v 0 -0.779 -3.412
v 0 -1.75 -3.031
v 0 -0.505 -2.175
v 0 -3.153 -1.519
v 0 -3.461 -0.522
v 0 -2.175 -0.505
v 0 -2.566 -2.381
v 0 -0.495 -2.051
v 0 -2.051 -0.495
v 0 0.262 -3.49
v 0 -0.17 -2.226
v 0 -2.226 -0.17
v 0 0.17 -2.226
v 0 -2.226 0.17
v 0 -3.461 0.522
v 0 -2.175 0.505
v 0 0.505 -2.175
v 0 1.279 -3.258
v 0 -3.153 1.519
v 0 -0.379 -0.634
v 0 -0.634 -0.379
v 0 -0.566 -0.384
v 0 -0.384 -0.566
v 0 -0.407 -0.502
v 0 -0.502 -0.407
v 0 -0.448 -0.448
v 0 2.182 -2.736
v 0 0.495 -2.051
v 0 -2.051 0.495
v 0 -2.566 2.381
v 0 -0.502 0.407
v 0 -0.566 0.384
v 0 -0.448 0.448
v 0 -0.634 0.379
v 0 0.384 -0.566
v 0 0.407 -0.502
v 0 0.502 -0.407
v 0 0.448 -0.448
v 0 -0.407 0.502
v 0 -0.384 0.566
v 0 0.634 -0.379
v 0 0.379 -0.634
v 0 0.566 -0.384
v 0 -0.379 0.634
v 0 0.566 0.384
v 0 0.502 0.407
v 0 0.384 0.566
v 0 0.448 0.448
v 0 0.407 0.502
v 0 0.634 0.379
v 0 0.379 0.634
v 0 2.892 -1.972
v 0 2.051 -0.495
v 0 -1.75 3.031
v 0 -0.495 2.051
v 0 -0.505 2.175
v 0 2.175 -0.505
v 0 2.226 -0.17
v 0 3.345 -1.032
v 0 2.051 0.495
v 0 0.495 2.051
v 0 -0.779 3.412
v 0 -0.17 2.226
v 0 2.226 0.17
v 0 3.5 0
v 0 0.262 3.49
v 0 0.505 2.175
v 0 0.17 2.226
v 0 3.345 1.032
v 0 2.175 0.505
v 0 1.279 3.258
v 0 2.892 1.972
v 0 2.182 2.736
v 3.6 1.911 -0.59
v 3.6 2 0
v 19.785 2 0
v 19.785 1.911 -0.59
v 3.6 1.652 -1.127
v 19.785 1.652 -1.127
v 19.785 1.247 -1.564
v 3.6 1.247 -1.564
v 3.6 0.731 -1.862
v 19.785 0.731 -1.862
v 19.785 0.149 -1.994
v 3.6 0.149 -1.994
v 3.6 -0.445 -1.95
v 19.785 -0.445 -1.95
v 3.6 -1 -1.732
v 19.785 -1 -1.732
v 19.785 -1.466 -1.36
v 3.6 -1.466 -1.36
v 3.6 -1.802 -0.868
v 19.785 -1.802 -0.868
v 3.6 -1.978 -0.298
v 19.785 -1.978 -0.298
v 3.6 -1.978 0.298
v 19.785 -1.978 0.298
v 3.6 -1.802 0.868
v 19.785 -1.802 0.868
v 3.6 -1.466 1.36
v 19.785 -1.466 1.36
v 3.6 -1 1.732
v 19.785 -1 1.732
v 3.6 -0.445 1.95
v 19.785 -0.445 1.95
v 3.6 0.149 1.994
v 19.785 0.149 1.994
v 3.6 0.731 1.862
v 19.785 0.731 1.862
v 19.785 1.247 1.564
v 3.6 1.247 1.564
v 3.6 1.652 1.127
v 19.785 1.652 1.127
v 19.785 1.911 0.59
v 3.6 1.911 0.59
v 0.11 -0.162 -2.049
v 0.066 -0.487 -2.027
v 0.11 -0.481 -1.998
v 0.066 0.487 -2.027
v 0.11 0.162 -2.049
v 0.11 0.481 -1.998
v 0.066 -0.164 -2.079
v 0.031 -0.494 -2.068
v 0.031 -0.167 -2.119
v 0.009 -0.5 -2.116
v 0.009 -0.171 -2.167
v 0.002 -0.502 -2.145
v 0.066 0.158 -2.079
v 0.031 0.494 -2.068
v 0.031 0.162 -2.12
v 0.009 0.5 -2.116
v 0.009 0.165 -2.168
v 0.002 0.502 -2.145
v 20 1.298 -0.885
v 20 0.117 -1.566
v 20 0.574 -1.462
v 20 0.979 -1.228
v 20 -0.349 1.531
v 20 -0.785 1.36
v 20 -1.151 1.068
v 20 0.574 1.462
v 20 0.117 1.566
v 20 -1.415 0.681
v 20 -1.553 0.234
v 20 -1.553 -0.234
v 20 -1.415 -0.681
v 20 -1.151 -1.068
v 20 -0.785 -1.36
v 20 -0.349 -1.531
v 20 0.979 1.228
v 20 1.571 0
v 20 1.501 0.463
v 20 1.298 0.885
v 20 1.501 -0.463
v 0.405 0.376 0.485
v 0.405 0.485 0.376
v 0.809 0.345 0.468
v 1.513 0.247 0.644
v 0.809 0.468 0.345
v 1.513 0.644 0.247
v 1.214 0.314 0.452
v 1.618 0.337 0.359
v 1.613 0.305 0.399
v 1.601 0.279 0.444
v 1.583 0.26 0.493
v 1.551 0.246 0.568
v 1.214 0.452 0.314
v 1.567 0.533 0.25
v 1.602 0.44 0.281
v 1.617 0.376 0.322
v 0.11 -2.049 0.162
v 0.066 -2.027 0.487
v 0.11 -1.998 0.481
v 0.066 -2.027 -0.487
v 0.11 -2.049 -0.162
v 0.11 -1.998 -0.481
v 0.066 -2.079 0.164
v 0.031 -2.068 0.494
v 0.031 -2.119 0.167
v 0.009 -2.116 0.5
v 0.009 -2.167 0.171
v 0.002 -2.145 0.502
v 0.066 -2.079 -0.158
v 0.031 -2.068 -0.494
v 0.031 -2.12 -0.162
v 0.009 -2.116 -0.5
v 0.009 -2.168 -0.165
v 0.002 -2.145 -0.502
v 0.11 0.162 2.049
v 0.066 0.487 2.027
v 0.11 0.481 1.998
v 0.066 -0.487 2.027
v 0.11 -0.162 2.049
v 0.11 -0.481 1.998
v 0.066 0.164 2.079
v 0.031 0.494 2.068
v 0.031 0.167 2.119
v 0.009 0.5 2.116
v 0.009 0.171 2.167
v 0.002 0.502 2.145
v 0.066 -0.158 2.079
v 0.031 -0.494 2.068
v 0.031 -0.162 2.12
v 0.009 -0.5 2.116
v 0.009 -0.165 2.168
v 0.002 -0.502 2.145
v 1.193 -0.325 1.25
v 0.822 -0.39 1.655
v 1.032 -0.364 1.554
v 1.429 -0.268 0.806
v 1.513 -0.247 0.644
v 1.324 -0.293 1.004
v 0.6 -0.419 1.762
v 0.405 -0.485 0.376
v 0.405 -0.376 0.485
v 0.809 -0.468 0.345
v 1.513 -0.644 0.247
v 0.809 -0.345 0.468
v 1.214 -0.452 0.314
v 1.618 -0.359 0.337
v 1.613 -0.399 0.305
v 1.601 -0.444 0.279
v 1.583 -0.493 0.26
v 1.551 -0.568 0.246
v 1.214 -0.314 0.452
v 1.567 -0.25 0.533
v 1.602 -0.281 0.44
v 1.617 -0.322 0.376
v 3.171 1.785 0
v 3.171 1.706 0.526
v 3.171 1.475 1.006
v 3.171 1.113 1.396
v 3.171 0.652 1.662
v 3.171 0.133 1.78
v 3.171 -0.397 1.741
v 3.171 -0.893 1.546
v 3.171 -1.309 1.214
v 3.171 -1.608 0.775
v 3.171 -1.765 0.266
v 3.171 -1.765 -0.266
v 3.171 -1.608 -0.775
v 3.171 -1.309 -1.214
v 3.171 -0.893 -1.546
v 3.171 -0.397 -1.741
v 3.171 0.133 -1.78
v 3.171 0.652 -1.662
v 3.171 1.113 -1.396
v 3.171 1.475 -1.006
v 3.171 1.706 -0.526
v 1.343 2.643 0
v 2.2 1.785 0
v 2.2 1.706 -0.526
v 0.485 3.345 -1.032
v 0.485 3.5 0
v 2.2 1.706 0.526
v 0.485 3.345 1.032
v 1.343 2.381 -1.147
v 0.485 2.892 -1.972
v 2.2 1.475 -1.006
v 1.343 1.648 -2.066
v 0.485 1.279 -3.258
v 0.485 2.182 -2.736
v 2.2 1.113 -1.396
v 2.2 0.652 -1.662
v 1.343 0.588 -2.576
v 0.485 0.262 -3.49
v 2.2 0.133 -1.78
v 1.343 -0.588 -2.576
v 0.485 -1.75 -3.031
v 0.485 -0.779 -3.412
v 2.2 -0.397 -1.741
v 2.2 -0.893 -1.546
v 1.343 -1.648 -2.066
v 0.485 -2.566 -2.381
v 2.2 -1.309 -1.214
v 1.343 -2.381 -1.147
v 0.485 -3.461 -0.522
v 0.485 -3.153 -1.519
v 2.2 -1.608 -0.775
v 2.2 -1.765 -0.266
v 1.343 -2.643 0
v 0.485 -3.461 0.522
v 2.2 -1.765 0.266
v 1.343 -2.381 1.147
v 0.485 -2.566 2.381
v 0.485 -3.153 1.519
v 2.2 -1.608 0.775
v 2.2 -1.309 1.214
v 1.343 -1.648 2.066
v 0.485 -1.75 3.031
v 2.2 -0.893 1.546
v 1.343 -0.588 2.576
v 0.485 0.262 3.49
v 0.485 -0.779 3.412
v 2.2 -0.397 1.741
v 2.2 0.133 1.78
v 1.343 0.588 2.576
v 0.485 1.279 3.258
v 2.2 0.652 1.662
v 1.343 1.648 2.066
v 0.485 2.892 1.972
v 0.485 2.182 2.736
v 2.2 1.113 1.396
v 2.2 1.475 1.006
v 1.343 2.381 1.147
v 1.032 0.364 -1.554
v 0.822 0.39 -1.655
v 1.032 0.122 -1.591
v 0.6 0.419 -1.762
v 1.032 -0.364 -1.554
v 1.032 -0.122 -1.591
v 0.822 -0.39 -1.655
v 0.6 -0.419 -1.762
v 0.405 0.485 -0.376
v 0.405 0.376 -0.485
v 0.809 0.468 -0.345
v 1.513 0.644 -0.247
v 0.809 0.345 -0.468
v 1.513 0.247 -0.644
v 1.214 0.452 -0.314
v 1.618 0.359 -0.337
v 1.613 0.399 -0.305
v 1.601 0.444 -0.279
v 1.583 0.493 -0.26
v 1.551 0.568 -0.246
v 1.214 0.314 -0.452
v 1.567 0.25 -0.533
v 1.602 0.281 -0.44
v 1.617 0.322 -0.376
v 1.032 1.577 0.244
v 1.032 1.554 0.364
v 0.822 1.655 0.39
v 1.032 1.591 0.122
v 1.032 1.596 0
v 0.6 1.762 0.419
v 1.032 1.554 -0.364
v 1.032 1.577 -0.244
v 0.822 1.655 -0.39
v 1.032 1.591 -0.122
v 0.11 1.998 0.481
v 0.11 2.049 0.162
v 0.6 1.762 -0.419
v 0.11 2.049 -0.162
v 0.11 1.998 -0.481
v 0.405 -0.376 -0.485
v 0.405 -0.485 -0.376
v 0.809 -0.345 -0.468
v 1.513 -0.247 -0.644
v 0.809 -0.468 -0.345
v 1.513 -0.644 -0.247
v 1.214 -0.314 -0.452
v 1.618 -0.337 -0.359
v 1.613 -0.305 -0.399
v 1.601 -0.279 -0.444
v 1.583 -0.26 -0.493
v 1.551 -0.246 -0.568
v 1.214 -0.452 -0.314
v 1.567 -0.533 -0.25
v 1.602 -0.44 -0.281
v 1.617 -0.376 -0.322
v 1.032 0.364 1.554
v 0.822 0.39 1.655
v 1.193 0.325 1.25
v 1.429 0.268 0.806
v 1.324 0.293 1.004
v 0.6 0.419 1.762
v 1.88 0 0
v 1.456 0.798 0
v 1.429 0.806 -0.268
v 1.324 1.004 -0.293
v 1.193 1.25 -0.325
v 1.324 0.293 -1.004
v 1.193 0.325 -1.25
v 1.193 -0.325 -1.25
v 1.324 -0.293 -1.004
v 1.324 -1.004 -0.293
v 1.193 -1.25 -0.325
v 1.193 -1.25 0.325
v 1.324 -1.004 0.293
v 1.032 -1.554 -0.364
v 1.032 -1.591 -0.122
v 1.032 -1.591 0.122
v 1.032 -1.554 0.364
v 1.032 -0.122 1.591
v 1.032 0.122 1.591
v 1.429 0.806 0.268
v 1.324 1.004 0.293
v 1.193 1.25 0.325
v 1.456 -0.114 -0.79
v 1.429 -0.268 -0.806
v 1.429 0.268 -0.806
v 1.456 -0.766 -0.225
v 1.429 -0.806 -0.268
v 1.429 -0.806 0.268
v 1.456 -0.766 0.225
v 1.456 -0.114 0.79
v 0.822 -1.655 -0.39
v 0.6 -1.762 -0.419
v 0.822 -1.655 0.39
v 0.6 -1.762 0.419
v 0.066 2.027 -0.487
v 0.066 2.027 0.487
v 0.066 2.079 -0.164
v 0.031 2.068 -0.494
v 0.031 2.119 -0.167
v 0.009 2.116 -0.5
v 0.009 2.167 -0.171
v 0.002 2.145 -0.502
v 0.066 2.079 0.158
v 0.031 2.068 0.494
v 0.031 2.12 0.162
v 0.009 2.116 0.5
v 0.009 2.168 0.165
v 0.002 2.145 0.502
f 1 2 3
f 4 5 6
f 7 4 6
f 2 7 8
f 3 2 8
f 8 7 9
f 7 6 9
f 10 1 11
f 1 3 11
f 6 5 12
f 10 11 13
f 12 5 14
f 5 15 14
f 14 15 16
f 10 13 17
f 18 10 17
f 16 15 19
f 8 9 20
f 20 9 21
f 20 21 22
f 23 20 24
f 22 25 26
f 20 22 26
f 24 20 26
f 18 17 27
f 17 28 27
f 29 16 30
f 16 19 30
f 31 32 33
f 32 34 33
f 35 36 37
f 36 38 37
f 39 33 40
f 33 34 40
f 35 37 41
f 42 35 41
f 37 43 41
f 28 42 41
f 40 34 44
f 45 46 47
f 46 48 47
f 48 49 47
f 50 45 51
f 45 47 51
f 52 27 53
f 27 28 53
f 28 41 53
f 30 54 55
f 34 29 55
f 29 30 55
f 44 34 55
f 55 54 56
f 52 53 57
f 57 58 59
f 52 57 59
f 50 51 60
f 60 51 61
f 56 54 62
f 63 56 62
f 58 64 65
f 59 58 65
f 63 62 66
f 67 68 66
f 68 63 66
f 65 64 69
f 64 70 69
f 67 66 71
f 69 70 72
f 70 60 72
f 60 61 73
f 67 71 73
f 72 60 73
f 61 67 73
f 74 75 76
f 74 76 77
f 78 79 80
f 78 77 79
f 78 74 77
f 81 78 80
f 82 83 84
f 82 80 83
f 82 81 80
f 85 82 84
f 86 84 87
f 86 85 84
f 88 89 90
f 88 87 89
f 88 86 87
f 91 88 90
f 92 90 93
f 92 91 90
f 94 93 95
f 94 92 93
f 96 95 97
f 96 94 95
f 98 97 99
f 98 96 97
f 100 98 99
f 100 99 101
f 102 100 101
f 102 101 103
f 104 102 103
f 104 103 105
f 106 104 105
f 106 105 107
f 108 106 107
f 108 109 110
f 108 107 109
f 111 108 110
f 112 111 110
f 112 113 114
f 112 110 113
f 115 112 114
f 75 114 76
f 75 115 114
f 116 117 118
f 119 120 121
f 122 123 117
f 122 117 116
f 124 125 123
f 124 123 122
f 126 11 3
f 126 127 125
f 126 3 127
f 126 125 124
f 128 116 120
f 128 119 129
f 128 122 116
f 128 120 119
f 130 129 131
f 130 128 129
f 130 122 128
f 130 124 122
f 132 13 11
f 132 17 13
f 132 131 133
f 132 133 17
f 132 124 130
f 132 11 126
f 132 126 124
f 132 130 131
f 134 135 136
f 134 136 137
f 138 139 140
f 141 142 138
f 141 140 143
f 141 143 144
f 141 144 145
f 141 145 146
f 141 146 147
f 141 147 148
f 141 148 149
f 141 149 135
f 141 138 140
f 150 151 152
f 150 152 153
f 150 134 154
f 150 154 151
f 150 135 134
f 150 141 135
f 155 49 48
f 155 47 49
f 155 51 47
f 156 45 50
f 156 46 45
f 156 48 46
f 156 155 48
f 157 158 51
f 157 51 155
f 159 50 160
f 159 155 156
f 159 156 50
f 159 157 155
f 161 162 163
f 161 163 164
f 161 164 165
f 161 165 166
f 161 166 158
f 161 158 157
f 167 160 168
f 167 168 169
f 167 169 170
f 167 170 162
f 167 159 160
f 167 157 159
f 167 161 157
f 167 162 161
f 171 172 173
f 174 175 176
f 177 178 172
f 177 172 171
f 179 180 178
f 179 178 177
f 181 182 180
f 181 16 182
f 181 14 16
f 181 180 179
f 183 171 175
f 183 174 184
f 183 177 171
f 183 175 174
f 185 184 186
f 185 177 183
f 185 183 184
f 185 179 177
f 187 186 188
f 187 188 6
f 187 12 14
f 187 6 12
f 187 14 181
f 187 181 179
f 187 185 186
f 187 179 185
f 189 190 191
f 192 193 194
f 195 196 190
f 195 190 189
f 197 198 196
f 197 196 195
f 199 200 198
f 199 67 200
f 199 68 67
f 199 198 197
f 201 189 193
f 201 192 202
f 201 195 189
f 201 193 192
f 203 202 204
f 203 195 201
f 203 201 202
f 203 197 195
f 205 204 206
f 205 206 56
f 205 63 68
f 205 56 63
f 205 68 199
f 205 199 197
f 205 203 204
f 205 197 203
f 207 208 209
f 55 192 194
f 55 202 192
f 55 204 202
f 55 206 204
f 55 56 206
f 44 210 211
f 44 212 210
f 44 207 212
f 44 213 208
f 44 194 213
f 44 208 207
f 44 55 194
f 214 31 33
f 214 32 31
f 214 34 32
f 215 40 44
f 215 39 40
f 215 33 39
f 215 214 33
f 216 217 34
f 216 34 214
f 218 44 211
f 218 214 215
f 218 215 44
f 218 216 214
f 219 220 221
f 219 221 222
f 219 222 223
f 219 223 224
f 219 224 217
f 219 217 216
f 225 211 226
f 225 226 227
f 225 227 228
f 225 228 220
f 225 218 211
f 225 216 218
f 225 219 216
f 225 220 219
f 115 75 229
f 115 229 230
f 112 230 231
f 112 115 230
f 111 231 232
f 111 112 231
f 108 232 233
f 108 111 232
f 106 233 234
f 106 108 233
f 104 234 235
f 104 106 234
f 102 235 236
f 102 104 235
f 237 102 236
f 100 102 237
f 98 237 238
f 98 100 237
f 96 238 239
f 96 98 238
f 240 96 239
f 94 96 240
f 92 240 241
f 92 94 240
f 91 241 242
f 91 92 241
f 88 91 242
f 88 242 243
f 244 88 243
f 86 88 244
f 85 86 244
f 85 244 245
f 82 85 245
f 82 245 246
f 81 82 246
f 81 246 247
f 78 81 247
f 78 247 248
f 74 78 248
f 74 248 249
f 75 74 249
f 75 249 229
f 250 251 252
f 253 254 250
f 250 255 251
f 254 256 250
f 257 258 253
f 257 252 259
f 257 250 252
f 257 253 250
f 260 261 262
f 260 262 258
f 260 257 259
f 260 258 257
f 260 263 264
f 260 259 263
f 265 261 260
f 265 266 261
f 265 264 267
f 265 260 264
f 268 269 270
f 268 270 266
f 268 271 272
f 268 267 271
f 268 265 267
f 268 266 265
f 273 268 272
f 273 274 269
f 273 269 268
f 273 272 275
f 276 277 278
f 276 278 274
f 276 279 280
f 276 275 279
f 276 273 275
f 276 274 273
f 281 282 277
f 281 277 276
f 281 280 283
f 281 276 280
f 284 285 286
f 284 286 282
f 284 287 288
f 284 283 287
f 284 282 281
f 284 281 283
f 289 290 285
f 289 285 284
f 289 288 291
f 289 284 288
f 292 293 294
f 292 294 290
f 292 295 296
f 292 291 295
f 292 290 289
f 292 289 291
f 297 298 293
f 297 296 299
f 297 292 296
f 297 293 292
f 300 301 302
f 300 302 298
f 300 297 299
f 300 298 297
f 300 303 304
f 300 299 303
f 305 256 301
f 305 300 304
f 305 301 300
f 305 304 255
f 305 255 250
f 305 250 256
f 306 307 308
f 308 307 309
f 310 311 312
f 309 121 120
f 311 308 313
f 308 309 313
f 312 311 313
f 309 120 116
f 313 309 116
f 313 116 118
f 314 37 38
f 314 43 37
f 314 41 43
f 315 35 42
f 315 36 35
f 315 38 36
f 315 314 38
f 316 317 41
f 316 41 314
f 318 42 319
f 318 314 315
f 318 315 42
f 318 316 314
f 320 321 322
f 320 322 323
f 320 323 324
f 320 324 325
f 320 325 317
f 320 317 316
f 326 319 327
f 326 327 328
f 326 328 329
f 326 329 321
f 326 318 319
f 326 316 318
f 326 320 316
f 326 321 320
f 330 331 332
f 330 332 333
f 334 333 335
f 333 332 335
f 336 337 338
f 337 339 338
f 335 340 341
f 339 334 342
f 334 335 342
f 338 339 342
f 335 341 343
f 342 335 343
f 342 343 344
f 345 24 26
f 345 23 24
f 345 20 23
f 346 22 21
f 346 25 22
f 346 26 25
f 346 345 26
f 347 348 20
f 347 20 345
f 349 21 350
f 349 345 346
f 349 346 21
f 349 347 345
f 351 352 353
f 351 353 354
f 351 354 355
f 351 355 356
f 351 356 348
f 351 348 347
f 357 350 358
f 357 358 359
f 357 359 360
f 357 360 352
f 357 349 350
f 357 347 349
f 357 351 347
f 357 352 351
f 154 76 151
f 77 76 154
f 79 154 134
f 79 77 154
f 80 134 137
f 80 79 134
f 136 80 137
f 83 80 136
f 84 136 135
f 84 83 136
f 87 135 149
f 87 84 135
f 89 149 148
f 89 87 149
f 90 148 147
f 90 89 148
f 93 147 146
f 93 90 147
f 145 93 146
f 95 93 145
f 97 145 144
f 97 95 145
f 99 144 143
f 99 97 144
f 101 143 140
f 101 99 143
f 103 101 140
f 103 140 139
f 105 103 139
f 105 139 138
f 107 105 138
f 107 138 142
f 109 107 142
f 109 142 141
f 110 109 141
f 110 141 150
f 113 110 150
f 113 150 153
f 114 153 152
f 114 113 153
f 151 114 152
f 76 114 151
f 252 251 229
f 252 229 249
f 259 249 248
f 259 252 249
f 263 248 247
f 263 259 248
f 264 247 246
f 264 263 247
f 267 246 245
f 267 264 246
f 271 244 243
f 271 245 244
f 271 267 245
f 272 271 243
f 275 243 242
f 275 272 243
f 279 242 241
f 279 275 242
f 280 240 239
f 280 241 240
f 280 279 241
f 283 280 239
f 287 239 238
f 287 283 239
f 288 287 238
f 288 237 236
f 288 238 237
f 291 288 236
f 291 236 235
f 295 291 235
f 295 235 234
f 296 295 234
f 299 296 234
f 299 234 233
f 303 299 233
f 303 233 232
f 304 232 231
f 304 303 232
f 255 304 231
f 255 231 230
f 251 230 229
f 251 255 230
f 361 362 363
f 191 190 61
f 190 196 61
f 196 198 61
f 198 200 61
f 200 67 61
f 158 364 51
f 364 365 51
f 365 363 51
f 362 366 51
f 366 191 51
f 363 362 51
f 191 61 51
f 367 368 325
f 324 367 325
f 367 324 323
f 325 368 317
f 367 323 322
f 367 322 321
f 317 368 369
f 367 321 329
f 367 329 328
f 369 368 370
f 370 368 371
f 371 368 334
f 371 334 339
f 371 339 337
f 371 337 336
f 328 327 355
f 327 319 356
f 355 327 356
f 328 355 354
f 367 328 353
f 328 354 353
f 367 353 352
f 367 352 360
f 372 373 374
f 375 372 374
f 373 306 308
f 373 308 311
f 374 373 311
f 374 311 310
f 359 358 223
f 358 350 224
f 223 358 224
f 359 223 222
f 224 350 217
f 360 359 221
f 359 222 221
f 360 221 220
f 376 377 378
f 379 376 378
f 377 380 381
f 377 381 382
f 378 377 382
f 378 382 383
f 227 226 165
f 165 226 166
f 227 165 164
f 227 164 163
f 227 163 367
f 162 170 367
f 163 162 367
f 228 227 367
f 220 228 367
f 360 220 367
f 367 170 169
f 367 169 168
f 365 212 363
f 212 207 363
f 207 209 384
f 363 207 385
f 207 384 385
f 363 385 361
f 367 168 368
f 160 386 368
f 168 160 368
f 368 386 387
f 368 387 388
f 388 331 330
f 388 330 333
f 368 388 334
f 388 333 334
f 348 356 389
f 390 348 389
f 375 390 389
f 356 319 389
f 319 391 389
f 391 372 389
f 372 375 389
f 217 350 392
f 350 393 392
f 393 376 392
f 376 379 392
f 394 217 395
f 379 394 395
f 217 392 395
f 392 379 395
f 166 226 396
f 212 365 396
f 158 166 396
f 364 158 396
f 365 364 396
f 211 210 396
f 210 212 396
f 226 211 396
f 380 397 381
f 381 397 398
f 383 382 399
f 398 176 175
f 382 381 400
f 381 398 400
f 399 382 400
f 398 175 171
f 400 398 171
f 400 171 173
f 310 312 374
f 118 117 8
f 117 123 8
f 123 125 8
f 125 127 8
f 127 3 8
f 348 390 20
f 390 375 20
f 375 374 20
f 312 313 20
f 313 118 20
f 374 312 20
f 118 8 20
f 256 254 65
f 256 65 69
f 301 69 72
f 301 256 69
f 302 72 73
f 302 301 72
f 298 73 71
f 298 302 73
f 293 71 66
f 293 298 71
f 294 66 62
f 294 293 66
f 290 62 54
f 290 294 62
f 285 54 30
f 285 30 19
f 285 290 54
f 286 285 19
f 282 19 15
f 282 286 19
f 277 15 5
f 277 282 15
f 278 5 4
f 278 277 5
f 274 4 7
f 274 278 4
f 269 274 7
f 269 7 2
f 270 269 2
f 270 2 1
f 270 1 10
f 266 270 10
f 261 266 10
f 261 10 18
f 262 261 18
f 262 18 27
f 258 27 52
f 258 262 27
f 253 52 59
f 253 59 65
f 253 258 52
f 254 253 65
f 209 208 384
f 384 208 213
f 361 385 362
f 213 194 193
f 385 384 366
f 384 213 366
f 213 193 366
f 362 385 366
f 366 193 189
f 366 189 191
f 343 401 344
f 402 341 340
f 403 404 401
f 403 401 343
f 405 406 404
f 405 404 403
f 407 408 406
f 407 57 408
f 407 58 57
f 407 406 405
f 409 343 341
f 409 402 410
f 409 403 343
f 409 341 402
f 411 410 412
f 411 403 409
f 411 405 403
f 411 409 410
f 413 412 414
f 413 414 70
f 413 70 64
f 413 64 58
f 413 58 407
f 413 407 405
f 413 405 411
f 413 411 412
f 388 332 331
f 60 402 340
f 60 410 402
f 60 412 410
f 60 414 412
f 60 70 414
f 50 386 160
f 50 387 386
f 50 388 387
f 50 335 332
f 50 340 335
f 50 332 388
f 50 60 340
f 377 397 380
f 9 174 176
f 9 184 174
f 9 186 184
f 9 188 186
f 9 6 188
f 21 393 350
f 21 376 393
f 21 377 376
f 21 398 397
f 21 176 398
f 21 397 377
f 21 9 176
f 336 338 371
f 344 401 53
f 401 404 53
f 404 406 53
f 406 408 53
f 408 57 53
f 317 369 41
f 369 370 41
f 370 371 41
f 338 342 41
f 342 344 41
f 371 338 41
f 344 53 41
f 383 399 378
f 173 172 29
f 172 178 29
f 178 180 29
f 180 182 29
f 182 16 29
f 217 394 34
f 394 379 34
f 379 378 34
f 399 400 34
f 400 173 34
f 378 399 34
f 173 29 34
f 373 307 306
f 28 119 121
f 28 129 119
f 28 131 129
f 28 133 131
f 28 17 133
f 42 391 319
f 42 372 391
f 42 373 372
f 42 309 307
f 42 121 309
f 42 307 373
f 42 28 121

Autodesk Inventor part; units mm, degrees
ref_plane "YZ Plane" through (0, 0, 0) normal (1, 0, 0) x (0, 1, 0)
ref_plane "XZ Plane" through (0, 0, 0) normal (0, 1, 0) x (-1, 0, 0)
sketch "Sketch1" plane through (0, 0, 0) normal (0, 0, 1) x (1, 0, 0)
  line L0 (1.88, 0) -> (20, 0)
  line L1 (20, 0) -> (20, 2)
  line L2 (20, 2) -> (3.6, 2)
  line L3 (3.6, 2) -> (3.1706, 1.7853)
  line L4 (3.1706, 1.7853) -> (2.2, 1.7853)
  line L5 (0, 3.5) -> (0, 2.11)
  line L6 (0, 2.11) -> (1.0316, 1.5957)
  line L7 (1.0316, 1.5957) -> (1.88, 0)
  line L8 (-4, 0) -> (24, 0) projected
  line L9 (0, -0.7) -> (0, 4.2) projected
  line L10 (0, 3.5) -> (0.4853, 3.5)
  line L11 (0.4853, 3.5) -> (2.2, 1.7853)
  line L12 (3.6, 2) -> (1.9853, 2) construction
  dimension "d1" = 16.4
  dimension "d2" = 4
  dimension "d3" = 3.5706
  dimension "d4" = 4.22
  dimension "d5" = 26.5
  dimension "d6" = 62
  dimension "d7" = 1.88
  dimension "d8" = 0.4294
  dimension "d12" = 7
  dimension "d13" = 45
  dimension "d15" = 20
  dimension "d24" = 2.2
revolve "Body" add sketch "Sketch1" angle 360 about axis through (1.88, 0, 0) along (1, 0, 0) contours L7 L6 L5 L10 L11 L4 L3 L2 L1 L0
sketch "Sketch2" plane through (0, 0, 0) normal (-1, 0, 0) x (0, 0, 1)
  line L0 (0, 2.11) -> (0, 0) construction
  line L1 (0, 0) -> (2.11, 0) construction
  arc A0 (0.633, 0) -> (0, 0.633) centre (0, 0) ccw construction
  arc A1 (0.7385, 0) -> (0, 0.7385) centre (0, 0) ccw construction
  arc A2 (2.0511, 0.495) -> (0.495, 2.0511) centre (0, 0) ccw
  line L2 (0, 0) -> (1.492, 1.492) construction
  line L3 (0.495, 2.0511) -> (0.3793, 0.6337)
  line L4 (2.0511, 0.495) -> (0.6337, 0.3793)
  arc A3 (0.495, 2.0511) -> (0, 2.11) centre (0, 0) ccw
  arc A4 (2.11, 0) -> (2.0511, 0.495) centre (0, 0) ccw
  line L5 (0, -4.9) -> (0, 4.9) projected
  line L6 (-4.9, 0) -> (4.9, 0) projected
  arc A5 (0.495, -2.0511) -> (2.0511, -0.495) centre (0, 0) ccw
  line L7 (0.495, -2.0511) -> (0.3793, -0.6337)
  line L8 (2.0511, -0.495) -> (0.6337, -0.3793)
  arc A6 (0, -2.11) -> (0.495, -2.0511) centre (0, 0) ccw
  arc A7 (2.0511, -0.495) -> (2.11, 0) centre (0, 0) ccw
  arc A8 (-0.495, 2.0511) -> (-2.0511, 0.495) centre (0, 0) ccw
  line L9 (-0.495, 2.0511) -> (-0.3793, 0.6337)
  line L10 (-2.0511, 0.495) -> (-0.6337, 0.3793)
  arc A9 (0, 2.11) -> (-0.495, 2.0511) centre (0, 0) ccw
  arc A10 (-2.0511, 0.495) -> (-2.11, 0) centre (0, 0) ccw
  arc A11 (-0.495, -2.0511) -> (0, -2.11) centre (0, 0) ccw
  arc A12 (-2.0511, -0.495) -> (-0.495, -2.0511) centre (0, 0) ccw
  arc A13 (-2.11, 0) -> (-2.0511, -0.495) centre (0, 0) ccw
  line L11 (-2.0511, -0.495) -> (-0.6337, -0.3793)
  line L12 (-0.495, -2.0511) -> (-0.3793, -0.6337)
  arc A14 (0.3793, 0.6337) -> (0.6337, 0.3793) centre (0.6145, 0.6145) ccw
  arc A15 (0.6337, -0.3793) -> (0.3793, -0.6337) centre (0.6145, -0.6145) ccw
  arc A16 (-0.6337, 0.3793) -> (-0.3793, 0.6337) centre (-0.6145, 0.6145) ccw
  arc A17 (-0.3793, -0.6337) -> (-0.6337, -0.3793) centre (-0.6145, -0.6145) ccw
  point P0 (1.492, -1.492)
  point P1 (-1.492, 1.492)
  point P2 (-1.492, -1.492)
  dimension "d17" = 1.266
  dimension "d18" = 1.477
  dimension "d19" = 4.22
  dimension "d20" = 45
  dimension "d21" = 0.495
extrude "Slot" add sketch "Sketch2" against normal up to next draft 5 contours L4 A14 L3 A2 | A5 L7 A15 L8 | L9 A16 L10 A8 | A12 L11 A17 L12
fillet "Fillet1" radius 0.198 4 edges at (0, 2.11, 0) (0, 0, -2.11) (0, -2.11, 0) (0, 0, 2.11)
thread "Thread" size "M4x0.7" class "6g" standard "ISO Metric profile" length 16.4
chamfer "Chamfer1" distance 0.4294 distance2 0.2147 1 edges at (20, -2, 0) measured on face at (20, -0.6473, 0.1595)
ref_plane "Work Plane2" through (3.35, 0, 0) normal (0, 0, -1) x (1, 0, 0)
equation "\"d17\" = 0.3 * SDM"
equation "\"d18\" = 0.35 * SDM"
equation "\"d19\" = SDM"
equation "\"d21\" = 0.5 * SBR"
equation "\"d1\" = GEL"
equation "\"d2\" = GD"
equation "\"d3\" = BDM"
equation "\"d4\" = SDM"
equation "\"d7\" = INTI"
equation "\"d8\" = GAL"
equation "\"d12\" = KOD"
equation "\"d13\" = 0.5 * SEWI"
equation "\"d15\" = NLG"
equation "\"d24\" = KOH"
equation "\"d23\" = 0.2 * SBR"
equation "\"d10\" = GEL"
equation "\"d25\" = -0.5 * SPD + 0.5 * GD"
equation "\"d26\" = 0.5 * GAL"
equation "\"NLG\" = 20"
equation "\"GEL\" = 16.4"
equation "\"GAL\" = 0.61345 * PTC"
equation "\"SPD\" = NND - 1.2269 * PTC"
equation "\"KOD\" = 7"
equation "\"KOH\" = 2.2"
equation "\"SBR\" = 0.99"
equation "\"INTI\" = 1.88"
equation "\"SDM\" = 4.22"
equation "\"GD\" = NND"
equation "\"BDM\" = NND - GAL"
equation "\"SEWI\" = 90deg"
equation "\"d9\" = SDM"
equation "\"GUL\" = 0.61345 * PTC"
equation "\"TOA\" = 30deg"
equation "\"EPV\" = 4.2"
equation "\"THREADDIA\" = 4"
equation "\"RR\" = 0.4"
equation "\"PTC\" = 0.7"
equation "\"NND\" = 4"
equation "\"GD1\" = THREADDIA - 1.2269 * PTC"
properties part number "AS 1427 - M4 x 20" material "Steel, Mild"
